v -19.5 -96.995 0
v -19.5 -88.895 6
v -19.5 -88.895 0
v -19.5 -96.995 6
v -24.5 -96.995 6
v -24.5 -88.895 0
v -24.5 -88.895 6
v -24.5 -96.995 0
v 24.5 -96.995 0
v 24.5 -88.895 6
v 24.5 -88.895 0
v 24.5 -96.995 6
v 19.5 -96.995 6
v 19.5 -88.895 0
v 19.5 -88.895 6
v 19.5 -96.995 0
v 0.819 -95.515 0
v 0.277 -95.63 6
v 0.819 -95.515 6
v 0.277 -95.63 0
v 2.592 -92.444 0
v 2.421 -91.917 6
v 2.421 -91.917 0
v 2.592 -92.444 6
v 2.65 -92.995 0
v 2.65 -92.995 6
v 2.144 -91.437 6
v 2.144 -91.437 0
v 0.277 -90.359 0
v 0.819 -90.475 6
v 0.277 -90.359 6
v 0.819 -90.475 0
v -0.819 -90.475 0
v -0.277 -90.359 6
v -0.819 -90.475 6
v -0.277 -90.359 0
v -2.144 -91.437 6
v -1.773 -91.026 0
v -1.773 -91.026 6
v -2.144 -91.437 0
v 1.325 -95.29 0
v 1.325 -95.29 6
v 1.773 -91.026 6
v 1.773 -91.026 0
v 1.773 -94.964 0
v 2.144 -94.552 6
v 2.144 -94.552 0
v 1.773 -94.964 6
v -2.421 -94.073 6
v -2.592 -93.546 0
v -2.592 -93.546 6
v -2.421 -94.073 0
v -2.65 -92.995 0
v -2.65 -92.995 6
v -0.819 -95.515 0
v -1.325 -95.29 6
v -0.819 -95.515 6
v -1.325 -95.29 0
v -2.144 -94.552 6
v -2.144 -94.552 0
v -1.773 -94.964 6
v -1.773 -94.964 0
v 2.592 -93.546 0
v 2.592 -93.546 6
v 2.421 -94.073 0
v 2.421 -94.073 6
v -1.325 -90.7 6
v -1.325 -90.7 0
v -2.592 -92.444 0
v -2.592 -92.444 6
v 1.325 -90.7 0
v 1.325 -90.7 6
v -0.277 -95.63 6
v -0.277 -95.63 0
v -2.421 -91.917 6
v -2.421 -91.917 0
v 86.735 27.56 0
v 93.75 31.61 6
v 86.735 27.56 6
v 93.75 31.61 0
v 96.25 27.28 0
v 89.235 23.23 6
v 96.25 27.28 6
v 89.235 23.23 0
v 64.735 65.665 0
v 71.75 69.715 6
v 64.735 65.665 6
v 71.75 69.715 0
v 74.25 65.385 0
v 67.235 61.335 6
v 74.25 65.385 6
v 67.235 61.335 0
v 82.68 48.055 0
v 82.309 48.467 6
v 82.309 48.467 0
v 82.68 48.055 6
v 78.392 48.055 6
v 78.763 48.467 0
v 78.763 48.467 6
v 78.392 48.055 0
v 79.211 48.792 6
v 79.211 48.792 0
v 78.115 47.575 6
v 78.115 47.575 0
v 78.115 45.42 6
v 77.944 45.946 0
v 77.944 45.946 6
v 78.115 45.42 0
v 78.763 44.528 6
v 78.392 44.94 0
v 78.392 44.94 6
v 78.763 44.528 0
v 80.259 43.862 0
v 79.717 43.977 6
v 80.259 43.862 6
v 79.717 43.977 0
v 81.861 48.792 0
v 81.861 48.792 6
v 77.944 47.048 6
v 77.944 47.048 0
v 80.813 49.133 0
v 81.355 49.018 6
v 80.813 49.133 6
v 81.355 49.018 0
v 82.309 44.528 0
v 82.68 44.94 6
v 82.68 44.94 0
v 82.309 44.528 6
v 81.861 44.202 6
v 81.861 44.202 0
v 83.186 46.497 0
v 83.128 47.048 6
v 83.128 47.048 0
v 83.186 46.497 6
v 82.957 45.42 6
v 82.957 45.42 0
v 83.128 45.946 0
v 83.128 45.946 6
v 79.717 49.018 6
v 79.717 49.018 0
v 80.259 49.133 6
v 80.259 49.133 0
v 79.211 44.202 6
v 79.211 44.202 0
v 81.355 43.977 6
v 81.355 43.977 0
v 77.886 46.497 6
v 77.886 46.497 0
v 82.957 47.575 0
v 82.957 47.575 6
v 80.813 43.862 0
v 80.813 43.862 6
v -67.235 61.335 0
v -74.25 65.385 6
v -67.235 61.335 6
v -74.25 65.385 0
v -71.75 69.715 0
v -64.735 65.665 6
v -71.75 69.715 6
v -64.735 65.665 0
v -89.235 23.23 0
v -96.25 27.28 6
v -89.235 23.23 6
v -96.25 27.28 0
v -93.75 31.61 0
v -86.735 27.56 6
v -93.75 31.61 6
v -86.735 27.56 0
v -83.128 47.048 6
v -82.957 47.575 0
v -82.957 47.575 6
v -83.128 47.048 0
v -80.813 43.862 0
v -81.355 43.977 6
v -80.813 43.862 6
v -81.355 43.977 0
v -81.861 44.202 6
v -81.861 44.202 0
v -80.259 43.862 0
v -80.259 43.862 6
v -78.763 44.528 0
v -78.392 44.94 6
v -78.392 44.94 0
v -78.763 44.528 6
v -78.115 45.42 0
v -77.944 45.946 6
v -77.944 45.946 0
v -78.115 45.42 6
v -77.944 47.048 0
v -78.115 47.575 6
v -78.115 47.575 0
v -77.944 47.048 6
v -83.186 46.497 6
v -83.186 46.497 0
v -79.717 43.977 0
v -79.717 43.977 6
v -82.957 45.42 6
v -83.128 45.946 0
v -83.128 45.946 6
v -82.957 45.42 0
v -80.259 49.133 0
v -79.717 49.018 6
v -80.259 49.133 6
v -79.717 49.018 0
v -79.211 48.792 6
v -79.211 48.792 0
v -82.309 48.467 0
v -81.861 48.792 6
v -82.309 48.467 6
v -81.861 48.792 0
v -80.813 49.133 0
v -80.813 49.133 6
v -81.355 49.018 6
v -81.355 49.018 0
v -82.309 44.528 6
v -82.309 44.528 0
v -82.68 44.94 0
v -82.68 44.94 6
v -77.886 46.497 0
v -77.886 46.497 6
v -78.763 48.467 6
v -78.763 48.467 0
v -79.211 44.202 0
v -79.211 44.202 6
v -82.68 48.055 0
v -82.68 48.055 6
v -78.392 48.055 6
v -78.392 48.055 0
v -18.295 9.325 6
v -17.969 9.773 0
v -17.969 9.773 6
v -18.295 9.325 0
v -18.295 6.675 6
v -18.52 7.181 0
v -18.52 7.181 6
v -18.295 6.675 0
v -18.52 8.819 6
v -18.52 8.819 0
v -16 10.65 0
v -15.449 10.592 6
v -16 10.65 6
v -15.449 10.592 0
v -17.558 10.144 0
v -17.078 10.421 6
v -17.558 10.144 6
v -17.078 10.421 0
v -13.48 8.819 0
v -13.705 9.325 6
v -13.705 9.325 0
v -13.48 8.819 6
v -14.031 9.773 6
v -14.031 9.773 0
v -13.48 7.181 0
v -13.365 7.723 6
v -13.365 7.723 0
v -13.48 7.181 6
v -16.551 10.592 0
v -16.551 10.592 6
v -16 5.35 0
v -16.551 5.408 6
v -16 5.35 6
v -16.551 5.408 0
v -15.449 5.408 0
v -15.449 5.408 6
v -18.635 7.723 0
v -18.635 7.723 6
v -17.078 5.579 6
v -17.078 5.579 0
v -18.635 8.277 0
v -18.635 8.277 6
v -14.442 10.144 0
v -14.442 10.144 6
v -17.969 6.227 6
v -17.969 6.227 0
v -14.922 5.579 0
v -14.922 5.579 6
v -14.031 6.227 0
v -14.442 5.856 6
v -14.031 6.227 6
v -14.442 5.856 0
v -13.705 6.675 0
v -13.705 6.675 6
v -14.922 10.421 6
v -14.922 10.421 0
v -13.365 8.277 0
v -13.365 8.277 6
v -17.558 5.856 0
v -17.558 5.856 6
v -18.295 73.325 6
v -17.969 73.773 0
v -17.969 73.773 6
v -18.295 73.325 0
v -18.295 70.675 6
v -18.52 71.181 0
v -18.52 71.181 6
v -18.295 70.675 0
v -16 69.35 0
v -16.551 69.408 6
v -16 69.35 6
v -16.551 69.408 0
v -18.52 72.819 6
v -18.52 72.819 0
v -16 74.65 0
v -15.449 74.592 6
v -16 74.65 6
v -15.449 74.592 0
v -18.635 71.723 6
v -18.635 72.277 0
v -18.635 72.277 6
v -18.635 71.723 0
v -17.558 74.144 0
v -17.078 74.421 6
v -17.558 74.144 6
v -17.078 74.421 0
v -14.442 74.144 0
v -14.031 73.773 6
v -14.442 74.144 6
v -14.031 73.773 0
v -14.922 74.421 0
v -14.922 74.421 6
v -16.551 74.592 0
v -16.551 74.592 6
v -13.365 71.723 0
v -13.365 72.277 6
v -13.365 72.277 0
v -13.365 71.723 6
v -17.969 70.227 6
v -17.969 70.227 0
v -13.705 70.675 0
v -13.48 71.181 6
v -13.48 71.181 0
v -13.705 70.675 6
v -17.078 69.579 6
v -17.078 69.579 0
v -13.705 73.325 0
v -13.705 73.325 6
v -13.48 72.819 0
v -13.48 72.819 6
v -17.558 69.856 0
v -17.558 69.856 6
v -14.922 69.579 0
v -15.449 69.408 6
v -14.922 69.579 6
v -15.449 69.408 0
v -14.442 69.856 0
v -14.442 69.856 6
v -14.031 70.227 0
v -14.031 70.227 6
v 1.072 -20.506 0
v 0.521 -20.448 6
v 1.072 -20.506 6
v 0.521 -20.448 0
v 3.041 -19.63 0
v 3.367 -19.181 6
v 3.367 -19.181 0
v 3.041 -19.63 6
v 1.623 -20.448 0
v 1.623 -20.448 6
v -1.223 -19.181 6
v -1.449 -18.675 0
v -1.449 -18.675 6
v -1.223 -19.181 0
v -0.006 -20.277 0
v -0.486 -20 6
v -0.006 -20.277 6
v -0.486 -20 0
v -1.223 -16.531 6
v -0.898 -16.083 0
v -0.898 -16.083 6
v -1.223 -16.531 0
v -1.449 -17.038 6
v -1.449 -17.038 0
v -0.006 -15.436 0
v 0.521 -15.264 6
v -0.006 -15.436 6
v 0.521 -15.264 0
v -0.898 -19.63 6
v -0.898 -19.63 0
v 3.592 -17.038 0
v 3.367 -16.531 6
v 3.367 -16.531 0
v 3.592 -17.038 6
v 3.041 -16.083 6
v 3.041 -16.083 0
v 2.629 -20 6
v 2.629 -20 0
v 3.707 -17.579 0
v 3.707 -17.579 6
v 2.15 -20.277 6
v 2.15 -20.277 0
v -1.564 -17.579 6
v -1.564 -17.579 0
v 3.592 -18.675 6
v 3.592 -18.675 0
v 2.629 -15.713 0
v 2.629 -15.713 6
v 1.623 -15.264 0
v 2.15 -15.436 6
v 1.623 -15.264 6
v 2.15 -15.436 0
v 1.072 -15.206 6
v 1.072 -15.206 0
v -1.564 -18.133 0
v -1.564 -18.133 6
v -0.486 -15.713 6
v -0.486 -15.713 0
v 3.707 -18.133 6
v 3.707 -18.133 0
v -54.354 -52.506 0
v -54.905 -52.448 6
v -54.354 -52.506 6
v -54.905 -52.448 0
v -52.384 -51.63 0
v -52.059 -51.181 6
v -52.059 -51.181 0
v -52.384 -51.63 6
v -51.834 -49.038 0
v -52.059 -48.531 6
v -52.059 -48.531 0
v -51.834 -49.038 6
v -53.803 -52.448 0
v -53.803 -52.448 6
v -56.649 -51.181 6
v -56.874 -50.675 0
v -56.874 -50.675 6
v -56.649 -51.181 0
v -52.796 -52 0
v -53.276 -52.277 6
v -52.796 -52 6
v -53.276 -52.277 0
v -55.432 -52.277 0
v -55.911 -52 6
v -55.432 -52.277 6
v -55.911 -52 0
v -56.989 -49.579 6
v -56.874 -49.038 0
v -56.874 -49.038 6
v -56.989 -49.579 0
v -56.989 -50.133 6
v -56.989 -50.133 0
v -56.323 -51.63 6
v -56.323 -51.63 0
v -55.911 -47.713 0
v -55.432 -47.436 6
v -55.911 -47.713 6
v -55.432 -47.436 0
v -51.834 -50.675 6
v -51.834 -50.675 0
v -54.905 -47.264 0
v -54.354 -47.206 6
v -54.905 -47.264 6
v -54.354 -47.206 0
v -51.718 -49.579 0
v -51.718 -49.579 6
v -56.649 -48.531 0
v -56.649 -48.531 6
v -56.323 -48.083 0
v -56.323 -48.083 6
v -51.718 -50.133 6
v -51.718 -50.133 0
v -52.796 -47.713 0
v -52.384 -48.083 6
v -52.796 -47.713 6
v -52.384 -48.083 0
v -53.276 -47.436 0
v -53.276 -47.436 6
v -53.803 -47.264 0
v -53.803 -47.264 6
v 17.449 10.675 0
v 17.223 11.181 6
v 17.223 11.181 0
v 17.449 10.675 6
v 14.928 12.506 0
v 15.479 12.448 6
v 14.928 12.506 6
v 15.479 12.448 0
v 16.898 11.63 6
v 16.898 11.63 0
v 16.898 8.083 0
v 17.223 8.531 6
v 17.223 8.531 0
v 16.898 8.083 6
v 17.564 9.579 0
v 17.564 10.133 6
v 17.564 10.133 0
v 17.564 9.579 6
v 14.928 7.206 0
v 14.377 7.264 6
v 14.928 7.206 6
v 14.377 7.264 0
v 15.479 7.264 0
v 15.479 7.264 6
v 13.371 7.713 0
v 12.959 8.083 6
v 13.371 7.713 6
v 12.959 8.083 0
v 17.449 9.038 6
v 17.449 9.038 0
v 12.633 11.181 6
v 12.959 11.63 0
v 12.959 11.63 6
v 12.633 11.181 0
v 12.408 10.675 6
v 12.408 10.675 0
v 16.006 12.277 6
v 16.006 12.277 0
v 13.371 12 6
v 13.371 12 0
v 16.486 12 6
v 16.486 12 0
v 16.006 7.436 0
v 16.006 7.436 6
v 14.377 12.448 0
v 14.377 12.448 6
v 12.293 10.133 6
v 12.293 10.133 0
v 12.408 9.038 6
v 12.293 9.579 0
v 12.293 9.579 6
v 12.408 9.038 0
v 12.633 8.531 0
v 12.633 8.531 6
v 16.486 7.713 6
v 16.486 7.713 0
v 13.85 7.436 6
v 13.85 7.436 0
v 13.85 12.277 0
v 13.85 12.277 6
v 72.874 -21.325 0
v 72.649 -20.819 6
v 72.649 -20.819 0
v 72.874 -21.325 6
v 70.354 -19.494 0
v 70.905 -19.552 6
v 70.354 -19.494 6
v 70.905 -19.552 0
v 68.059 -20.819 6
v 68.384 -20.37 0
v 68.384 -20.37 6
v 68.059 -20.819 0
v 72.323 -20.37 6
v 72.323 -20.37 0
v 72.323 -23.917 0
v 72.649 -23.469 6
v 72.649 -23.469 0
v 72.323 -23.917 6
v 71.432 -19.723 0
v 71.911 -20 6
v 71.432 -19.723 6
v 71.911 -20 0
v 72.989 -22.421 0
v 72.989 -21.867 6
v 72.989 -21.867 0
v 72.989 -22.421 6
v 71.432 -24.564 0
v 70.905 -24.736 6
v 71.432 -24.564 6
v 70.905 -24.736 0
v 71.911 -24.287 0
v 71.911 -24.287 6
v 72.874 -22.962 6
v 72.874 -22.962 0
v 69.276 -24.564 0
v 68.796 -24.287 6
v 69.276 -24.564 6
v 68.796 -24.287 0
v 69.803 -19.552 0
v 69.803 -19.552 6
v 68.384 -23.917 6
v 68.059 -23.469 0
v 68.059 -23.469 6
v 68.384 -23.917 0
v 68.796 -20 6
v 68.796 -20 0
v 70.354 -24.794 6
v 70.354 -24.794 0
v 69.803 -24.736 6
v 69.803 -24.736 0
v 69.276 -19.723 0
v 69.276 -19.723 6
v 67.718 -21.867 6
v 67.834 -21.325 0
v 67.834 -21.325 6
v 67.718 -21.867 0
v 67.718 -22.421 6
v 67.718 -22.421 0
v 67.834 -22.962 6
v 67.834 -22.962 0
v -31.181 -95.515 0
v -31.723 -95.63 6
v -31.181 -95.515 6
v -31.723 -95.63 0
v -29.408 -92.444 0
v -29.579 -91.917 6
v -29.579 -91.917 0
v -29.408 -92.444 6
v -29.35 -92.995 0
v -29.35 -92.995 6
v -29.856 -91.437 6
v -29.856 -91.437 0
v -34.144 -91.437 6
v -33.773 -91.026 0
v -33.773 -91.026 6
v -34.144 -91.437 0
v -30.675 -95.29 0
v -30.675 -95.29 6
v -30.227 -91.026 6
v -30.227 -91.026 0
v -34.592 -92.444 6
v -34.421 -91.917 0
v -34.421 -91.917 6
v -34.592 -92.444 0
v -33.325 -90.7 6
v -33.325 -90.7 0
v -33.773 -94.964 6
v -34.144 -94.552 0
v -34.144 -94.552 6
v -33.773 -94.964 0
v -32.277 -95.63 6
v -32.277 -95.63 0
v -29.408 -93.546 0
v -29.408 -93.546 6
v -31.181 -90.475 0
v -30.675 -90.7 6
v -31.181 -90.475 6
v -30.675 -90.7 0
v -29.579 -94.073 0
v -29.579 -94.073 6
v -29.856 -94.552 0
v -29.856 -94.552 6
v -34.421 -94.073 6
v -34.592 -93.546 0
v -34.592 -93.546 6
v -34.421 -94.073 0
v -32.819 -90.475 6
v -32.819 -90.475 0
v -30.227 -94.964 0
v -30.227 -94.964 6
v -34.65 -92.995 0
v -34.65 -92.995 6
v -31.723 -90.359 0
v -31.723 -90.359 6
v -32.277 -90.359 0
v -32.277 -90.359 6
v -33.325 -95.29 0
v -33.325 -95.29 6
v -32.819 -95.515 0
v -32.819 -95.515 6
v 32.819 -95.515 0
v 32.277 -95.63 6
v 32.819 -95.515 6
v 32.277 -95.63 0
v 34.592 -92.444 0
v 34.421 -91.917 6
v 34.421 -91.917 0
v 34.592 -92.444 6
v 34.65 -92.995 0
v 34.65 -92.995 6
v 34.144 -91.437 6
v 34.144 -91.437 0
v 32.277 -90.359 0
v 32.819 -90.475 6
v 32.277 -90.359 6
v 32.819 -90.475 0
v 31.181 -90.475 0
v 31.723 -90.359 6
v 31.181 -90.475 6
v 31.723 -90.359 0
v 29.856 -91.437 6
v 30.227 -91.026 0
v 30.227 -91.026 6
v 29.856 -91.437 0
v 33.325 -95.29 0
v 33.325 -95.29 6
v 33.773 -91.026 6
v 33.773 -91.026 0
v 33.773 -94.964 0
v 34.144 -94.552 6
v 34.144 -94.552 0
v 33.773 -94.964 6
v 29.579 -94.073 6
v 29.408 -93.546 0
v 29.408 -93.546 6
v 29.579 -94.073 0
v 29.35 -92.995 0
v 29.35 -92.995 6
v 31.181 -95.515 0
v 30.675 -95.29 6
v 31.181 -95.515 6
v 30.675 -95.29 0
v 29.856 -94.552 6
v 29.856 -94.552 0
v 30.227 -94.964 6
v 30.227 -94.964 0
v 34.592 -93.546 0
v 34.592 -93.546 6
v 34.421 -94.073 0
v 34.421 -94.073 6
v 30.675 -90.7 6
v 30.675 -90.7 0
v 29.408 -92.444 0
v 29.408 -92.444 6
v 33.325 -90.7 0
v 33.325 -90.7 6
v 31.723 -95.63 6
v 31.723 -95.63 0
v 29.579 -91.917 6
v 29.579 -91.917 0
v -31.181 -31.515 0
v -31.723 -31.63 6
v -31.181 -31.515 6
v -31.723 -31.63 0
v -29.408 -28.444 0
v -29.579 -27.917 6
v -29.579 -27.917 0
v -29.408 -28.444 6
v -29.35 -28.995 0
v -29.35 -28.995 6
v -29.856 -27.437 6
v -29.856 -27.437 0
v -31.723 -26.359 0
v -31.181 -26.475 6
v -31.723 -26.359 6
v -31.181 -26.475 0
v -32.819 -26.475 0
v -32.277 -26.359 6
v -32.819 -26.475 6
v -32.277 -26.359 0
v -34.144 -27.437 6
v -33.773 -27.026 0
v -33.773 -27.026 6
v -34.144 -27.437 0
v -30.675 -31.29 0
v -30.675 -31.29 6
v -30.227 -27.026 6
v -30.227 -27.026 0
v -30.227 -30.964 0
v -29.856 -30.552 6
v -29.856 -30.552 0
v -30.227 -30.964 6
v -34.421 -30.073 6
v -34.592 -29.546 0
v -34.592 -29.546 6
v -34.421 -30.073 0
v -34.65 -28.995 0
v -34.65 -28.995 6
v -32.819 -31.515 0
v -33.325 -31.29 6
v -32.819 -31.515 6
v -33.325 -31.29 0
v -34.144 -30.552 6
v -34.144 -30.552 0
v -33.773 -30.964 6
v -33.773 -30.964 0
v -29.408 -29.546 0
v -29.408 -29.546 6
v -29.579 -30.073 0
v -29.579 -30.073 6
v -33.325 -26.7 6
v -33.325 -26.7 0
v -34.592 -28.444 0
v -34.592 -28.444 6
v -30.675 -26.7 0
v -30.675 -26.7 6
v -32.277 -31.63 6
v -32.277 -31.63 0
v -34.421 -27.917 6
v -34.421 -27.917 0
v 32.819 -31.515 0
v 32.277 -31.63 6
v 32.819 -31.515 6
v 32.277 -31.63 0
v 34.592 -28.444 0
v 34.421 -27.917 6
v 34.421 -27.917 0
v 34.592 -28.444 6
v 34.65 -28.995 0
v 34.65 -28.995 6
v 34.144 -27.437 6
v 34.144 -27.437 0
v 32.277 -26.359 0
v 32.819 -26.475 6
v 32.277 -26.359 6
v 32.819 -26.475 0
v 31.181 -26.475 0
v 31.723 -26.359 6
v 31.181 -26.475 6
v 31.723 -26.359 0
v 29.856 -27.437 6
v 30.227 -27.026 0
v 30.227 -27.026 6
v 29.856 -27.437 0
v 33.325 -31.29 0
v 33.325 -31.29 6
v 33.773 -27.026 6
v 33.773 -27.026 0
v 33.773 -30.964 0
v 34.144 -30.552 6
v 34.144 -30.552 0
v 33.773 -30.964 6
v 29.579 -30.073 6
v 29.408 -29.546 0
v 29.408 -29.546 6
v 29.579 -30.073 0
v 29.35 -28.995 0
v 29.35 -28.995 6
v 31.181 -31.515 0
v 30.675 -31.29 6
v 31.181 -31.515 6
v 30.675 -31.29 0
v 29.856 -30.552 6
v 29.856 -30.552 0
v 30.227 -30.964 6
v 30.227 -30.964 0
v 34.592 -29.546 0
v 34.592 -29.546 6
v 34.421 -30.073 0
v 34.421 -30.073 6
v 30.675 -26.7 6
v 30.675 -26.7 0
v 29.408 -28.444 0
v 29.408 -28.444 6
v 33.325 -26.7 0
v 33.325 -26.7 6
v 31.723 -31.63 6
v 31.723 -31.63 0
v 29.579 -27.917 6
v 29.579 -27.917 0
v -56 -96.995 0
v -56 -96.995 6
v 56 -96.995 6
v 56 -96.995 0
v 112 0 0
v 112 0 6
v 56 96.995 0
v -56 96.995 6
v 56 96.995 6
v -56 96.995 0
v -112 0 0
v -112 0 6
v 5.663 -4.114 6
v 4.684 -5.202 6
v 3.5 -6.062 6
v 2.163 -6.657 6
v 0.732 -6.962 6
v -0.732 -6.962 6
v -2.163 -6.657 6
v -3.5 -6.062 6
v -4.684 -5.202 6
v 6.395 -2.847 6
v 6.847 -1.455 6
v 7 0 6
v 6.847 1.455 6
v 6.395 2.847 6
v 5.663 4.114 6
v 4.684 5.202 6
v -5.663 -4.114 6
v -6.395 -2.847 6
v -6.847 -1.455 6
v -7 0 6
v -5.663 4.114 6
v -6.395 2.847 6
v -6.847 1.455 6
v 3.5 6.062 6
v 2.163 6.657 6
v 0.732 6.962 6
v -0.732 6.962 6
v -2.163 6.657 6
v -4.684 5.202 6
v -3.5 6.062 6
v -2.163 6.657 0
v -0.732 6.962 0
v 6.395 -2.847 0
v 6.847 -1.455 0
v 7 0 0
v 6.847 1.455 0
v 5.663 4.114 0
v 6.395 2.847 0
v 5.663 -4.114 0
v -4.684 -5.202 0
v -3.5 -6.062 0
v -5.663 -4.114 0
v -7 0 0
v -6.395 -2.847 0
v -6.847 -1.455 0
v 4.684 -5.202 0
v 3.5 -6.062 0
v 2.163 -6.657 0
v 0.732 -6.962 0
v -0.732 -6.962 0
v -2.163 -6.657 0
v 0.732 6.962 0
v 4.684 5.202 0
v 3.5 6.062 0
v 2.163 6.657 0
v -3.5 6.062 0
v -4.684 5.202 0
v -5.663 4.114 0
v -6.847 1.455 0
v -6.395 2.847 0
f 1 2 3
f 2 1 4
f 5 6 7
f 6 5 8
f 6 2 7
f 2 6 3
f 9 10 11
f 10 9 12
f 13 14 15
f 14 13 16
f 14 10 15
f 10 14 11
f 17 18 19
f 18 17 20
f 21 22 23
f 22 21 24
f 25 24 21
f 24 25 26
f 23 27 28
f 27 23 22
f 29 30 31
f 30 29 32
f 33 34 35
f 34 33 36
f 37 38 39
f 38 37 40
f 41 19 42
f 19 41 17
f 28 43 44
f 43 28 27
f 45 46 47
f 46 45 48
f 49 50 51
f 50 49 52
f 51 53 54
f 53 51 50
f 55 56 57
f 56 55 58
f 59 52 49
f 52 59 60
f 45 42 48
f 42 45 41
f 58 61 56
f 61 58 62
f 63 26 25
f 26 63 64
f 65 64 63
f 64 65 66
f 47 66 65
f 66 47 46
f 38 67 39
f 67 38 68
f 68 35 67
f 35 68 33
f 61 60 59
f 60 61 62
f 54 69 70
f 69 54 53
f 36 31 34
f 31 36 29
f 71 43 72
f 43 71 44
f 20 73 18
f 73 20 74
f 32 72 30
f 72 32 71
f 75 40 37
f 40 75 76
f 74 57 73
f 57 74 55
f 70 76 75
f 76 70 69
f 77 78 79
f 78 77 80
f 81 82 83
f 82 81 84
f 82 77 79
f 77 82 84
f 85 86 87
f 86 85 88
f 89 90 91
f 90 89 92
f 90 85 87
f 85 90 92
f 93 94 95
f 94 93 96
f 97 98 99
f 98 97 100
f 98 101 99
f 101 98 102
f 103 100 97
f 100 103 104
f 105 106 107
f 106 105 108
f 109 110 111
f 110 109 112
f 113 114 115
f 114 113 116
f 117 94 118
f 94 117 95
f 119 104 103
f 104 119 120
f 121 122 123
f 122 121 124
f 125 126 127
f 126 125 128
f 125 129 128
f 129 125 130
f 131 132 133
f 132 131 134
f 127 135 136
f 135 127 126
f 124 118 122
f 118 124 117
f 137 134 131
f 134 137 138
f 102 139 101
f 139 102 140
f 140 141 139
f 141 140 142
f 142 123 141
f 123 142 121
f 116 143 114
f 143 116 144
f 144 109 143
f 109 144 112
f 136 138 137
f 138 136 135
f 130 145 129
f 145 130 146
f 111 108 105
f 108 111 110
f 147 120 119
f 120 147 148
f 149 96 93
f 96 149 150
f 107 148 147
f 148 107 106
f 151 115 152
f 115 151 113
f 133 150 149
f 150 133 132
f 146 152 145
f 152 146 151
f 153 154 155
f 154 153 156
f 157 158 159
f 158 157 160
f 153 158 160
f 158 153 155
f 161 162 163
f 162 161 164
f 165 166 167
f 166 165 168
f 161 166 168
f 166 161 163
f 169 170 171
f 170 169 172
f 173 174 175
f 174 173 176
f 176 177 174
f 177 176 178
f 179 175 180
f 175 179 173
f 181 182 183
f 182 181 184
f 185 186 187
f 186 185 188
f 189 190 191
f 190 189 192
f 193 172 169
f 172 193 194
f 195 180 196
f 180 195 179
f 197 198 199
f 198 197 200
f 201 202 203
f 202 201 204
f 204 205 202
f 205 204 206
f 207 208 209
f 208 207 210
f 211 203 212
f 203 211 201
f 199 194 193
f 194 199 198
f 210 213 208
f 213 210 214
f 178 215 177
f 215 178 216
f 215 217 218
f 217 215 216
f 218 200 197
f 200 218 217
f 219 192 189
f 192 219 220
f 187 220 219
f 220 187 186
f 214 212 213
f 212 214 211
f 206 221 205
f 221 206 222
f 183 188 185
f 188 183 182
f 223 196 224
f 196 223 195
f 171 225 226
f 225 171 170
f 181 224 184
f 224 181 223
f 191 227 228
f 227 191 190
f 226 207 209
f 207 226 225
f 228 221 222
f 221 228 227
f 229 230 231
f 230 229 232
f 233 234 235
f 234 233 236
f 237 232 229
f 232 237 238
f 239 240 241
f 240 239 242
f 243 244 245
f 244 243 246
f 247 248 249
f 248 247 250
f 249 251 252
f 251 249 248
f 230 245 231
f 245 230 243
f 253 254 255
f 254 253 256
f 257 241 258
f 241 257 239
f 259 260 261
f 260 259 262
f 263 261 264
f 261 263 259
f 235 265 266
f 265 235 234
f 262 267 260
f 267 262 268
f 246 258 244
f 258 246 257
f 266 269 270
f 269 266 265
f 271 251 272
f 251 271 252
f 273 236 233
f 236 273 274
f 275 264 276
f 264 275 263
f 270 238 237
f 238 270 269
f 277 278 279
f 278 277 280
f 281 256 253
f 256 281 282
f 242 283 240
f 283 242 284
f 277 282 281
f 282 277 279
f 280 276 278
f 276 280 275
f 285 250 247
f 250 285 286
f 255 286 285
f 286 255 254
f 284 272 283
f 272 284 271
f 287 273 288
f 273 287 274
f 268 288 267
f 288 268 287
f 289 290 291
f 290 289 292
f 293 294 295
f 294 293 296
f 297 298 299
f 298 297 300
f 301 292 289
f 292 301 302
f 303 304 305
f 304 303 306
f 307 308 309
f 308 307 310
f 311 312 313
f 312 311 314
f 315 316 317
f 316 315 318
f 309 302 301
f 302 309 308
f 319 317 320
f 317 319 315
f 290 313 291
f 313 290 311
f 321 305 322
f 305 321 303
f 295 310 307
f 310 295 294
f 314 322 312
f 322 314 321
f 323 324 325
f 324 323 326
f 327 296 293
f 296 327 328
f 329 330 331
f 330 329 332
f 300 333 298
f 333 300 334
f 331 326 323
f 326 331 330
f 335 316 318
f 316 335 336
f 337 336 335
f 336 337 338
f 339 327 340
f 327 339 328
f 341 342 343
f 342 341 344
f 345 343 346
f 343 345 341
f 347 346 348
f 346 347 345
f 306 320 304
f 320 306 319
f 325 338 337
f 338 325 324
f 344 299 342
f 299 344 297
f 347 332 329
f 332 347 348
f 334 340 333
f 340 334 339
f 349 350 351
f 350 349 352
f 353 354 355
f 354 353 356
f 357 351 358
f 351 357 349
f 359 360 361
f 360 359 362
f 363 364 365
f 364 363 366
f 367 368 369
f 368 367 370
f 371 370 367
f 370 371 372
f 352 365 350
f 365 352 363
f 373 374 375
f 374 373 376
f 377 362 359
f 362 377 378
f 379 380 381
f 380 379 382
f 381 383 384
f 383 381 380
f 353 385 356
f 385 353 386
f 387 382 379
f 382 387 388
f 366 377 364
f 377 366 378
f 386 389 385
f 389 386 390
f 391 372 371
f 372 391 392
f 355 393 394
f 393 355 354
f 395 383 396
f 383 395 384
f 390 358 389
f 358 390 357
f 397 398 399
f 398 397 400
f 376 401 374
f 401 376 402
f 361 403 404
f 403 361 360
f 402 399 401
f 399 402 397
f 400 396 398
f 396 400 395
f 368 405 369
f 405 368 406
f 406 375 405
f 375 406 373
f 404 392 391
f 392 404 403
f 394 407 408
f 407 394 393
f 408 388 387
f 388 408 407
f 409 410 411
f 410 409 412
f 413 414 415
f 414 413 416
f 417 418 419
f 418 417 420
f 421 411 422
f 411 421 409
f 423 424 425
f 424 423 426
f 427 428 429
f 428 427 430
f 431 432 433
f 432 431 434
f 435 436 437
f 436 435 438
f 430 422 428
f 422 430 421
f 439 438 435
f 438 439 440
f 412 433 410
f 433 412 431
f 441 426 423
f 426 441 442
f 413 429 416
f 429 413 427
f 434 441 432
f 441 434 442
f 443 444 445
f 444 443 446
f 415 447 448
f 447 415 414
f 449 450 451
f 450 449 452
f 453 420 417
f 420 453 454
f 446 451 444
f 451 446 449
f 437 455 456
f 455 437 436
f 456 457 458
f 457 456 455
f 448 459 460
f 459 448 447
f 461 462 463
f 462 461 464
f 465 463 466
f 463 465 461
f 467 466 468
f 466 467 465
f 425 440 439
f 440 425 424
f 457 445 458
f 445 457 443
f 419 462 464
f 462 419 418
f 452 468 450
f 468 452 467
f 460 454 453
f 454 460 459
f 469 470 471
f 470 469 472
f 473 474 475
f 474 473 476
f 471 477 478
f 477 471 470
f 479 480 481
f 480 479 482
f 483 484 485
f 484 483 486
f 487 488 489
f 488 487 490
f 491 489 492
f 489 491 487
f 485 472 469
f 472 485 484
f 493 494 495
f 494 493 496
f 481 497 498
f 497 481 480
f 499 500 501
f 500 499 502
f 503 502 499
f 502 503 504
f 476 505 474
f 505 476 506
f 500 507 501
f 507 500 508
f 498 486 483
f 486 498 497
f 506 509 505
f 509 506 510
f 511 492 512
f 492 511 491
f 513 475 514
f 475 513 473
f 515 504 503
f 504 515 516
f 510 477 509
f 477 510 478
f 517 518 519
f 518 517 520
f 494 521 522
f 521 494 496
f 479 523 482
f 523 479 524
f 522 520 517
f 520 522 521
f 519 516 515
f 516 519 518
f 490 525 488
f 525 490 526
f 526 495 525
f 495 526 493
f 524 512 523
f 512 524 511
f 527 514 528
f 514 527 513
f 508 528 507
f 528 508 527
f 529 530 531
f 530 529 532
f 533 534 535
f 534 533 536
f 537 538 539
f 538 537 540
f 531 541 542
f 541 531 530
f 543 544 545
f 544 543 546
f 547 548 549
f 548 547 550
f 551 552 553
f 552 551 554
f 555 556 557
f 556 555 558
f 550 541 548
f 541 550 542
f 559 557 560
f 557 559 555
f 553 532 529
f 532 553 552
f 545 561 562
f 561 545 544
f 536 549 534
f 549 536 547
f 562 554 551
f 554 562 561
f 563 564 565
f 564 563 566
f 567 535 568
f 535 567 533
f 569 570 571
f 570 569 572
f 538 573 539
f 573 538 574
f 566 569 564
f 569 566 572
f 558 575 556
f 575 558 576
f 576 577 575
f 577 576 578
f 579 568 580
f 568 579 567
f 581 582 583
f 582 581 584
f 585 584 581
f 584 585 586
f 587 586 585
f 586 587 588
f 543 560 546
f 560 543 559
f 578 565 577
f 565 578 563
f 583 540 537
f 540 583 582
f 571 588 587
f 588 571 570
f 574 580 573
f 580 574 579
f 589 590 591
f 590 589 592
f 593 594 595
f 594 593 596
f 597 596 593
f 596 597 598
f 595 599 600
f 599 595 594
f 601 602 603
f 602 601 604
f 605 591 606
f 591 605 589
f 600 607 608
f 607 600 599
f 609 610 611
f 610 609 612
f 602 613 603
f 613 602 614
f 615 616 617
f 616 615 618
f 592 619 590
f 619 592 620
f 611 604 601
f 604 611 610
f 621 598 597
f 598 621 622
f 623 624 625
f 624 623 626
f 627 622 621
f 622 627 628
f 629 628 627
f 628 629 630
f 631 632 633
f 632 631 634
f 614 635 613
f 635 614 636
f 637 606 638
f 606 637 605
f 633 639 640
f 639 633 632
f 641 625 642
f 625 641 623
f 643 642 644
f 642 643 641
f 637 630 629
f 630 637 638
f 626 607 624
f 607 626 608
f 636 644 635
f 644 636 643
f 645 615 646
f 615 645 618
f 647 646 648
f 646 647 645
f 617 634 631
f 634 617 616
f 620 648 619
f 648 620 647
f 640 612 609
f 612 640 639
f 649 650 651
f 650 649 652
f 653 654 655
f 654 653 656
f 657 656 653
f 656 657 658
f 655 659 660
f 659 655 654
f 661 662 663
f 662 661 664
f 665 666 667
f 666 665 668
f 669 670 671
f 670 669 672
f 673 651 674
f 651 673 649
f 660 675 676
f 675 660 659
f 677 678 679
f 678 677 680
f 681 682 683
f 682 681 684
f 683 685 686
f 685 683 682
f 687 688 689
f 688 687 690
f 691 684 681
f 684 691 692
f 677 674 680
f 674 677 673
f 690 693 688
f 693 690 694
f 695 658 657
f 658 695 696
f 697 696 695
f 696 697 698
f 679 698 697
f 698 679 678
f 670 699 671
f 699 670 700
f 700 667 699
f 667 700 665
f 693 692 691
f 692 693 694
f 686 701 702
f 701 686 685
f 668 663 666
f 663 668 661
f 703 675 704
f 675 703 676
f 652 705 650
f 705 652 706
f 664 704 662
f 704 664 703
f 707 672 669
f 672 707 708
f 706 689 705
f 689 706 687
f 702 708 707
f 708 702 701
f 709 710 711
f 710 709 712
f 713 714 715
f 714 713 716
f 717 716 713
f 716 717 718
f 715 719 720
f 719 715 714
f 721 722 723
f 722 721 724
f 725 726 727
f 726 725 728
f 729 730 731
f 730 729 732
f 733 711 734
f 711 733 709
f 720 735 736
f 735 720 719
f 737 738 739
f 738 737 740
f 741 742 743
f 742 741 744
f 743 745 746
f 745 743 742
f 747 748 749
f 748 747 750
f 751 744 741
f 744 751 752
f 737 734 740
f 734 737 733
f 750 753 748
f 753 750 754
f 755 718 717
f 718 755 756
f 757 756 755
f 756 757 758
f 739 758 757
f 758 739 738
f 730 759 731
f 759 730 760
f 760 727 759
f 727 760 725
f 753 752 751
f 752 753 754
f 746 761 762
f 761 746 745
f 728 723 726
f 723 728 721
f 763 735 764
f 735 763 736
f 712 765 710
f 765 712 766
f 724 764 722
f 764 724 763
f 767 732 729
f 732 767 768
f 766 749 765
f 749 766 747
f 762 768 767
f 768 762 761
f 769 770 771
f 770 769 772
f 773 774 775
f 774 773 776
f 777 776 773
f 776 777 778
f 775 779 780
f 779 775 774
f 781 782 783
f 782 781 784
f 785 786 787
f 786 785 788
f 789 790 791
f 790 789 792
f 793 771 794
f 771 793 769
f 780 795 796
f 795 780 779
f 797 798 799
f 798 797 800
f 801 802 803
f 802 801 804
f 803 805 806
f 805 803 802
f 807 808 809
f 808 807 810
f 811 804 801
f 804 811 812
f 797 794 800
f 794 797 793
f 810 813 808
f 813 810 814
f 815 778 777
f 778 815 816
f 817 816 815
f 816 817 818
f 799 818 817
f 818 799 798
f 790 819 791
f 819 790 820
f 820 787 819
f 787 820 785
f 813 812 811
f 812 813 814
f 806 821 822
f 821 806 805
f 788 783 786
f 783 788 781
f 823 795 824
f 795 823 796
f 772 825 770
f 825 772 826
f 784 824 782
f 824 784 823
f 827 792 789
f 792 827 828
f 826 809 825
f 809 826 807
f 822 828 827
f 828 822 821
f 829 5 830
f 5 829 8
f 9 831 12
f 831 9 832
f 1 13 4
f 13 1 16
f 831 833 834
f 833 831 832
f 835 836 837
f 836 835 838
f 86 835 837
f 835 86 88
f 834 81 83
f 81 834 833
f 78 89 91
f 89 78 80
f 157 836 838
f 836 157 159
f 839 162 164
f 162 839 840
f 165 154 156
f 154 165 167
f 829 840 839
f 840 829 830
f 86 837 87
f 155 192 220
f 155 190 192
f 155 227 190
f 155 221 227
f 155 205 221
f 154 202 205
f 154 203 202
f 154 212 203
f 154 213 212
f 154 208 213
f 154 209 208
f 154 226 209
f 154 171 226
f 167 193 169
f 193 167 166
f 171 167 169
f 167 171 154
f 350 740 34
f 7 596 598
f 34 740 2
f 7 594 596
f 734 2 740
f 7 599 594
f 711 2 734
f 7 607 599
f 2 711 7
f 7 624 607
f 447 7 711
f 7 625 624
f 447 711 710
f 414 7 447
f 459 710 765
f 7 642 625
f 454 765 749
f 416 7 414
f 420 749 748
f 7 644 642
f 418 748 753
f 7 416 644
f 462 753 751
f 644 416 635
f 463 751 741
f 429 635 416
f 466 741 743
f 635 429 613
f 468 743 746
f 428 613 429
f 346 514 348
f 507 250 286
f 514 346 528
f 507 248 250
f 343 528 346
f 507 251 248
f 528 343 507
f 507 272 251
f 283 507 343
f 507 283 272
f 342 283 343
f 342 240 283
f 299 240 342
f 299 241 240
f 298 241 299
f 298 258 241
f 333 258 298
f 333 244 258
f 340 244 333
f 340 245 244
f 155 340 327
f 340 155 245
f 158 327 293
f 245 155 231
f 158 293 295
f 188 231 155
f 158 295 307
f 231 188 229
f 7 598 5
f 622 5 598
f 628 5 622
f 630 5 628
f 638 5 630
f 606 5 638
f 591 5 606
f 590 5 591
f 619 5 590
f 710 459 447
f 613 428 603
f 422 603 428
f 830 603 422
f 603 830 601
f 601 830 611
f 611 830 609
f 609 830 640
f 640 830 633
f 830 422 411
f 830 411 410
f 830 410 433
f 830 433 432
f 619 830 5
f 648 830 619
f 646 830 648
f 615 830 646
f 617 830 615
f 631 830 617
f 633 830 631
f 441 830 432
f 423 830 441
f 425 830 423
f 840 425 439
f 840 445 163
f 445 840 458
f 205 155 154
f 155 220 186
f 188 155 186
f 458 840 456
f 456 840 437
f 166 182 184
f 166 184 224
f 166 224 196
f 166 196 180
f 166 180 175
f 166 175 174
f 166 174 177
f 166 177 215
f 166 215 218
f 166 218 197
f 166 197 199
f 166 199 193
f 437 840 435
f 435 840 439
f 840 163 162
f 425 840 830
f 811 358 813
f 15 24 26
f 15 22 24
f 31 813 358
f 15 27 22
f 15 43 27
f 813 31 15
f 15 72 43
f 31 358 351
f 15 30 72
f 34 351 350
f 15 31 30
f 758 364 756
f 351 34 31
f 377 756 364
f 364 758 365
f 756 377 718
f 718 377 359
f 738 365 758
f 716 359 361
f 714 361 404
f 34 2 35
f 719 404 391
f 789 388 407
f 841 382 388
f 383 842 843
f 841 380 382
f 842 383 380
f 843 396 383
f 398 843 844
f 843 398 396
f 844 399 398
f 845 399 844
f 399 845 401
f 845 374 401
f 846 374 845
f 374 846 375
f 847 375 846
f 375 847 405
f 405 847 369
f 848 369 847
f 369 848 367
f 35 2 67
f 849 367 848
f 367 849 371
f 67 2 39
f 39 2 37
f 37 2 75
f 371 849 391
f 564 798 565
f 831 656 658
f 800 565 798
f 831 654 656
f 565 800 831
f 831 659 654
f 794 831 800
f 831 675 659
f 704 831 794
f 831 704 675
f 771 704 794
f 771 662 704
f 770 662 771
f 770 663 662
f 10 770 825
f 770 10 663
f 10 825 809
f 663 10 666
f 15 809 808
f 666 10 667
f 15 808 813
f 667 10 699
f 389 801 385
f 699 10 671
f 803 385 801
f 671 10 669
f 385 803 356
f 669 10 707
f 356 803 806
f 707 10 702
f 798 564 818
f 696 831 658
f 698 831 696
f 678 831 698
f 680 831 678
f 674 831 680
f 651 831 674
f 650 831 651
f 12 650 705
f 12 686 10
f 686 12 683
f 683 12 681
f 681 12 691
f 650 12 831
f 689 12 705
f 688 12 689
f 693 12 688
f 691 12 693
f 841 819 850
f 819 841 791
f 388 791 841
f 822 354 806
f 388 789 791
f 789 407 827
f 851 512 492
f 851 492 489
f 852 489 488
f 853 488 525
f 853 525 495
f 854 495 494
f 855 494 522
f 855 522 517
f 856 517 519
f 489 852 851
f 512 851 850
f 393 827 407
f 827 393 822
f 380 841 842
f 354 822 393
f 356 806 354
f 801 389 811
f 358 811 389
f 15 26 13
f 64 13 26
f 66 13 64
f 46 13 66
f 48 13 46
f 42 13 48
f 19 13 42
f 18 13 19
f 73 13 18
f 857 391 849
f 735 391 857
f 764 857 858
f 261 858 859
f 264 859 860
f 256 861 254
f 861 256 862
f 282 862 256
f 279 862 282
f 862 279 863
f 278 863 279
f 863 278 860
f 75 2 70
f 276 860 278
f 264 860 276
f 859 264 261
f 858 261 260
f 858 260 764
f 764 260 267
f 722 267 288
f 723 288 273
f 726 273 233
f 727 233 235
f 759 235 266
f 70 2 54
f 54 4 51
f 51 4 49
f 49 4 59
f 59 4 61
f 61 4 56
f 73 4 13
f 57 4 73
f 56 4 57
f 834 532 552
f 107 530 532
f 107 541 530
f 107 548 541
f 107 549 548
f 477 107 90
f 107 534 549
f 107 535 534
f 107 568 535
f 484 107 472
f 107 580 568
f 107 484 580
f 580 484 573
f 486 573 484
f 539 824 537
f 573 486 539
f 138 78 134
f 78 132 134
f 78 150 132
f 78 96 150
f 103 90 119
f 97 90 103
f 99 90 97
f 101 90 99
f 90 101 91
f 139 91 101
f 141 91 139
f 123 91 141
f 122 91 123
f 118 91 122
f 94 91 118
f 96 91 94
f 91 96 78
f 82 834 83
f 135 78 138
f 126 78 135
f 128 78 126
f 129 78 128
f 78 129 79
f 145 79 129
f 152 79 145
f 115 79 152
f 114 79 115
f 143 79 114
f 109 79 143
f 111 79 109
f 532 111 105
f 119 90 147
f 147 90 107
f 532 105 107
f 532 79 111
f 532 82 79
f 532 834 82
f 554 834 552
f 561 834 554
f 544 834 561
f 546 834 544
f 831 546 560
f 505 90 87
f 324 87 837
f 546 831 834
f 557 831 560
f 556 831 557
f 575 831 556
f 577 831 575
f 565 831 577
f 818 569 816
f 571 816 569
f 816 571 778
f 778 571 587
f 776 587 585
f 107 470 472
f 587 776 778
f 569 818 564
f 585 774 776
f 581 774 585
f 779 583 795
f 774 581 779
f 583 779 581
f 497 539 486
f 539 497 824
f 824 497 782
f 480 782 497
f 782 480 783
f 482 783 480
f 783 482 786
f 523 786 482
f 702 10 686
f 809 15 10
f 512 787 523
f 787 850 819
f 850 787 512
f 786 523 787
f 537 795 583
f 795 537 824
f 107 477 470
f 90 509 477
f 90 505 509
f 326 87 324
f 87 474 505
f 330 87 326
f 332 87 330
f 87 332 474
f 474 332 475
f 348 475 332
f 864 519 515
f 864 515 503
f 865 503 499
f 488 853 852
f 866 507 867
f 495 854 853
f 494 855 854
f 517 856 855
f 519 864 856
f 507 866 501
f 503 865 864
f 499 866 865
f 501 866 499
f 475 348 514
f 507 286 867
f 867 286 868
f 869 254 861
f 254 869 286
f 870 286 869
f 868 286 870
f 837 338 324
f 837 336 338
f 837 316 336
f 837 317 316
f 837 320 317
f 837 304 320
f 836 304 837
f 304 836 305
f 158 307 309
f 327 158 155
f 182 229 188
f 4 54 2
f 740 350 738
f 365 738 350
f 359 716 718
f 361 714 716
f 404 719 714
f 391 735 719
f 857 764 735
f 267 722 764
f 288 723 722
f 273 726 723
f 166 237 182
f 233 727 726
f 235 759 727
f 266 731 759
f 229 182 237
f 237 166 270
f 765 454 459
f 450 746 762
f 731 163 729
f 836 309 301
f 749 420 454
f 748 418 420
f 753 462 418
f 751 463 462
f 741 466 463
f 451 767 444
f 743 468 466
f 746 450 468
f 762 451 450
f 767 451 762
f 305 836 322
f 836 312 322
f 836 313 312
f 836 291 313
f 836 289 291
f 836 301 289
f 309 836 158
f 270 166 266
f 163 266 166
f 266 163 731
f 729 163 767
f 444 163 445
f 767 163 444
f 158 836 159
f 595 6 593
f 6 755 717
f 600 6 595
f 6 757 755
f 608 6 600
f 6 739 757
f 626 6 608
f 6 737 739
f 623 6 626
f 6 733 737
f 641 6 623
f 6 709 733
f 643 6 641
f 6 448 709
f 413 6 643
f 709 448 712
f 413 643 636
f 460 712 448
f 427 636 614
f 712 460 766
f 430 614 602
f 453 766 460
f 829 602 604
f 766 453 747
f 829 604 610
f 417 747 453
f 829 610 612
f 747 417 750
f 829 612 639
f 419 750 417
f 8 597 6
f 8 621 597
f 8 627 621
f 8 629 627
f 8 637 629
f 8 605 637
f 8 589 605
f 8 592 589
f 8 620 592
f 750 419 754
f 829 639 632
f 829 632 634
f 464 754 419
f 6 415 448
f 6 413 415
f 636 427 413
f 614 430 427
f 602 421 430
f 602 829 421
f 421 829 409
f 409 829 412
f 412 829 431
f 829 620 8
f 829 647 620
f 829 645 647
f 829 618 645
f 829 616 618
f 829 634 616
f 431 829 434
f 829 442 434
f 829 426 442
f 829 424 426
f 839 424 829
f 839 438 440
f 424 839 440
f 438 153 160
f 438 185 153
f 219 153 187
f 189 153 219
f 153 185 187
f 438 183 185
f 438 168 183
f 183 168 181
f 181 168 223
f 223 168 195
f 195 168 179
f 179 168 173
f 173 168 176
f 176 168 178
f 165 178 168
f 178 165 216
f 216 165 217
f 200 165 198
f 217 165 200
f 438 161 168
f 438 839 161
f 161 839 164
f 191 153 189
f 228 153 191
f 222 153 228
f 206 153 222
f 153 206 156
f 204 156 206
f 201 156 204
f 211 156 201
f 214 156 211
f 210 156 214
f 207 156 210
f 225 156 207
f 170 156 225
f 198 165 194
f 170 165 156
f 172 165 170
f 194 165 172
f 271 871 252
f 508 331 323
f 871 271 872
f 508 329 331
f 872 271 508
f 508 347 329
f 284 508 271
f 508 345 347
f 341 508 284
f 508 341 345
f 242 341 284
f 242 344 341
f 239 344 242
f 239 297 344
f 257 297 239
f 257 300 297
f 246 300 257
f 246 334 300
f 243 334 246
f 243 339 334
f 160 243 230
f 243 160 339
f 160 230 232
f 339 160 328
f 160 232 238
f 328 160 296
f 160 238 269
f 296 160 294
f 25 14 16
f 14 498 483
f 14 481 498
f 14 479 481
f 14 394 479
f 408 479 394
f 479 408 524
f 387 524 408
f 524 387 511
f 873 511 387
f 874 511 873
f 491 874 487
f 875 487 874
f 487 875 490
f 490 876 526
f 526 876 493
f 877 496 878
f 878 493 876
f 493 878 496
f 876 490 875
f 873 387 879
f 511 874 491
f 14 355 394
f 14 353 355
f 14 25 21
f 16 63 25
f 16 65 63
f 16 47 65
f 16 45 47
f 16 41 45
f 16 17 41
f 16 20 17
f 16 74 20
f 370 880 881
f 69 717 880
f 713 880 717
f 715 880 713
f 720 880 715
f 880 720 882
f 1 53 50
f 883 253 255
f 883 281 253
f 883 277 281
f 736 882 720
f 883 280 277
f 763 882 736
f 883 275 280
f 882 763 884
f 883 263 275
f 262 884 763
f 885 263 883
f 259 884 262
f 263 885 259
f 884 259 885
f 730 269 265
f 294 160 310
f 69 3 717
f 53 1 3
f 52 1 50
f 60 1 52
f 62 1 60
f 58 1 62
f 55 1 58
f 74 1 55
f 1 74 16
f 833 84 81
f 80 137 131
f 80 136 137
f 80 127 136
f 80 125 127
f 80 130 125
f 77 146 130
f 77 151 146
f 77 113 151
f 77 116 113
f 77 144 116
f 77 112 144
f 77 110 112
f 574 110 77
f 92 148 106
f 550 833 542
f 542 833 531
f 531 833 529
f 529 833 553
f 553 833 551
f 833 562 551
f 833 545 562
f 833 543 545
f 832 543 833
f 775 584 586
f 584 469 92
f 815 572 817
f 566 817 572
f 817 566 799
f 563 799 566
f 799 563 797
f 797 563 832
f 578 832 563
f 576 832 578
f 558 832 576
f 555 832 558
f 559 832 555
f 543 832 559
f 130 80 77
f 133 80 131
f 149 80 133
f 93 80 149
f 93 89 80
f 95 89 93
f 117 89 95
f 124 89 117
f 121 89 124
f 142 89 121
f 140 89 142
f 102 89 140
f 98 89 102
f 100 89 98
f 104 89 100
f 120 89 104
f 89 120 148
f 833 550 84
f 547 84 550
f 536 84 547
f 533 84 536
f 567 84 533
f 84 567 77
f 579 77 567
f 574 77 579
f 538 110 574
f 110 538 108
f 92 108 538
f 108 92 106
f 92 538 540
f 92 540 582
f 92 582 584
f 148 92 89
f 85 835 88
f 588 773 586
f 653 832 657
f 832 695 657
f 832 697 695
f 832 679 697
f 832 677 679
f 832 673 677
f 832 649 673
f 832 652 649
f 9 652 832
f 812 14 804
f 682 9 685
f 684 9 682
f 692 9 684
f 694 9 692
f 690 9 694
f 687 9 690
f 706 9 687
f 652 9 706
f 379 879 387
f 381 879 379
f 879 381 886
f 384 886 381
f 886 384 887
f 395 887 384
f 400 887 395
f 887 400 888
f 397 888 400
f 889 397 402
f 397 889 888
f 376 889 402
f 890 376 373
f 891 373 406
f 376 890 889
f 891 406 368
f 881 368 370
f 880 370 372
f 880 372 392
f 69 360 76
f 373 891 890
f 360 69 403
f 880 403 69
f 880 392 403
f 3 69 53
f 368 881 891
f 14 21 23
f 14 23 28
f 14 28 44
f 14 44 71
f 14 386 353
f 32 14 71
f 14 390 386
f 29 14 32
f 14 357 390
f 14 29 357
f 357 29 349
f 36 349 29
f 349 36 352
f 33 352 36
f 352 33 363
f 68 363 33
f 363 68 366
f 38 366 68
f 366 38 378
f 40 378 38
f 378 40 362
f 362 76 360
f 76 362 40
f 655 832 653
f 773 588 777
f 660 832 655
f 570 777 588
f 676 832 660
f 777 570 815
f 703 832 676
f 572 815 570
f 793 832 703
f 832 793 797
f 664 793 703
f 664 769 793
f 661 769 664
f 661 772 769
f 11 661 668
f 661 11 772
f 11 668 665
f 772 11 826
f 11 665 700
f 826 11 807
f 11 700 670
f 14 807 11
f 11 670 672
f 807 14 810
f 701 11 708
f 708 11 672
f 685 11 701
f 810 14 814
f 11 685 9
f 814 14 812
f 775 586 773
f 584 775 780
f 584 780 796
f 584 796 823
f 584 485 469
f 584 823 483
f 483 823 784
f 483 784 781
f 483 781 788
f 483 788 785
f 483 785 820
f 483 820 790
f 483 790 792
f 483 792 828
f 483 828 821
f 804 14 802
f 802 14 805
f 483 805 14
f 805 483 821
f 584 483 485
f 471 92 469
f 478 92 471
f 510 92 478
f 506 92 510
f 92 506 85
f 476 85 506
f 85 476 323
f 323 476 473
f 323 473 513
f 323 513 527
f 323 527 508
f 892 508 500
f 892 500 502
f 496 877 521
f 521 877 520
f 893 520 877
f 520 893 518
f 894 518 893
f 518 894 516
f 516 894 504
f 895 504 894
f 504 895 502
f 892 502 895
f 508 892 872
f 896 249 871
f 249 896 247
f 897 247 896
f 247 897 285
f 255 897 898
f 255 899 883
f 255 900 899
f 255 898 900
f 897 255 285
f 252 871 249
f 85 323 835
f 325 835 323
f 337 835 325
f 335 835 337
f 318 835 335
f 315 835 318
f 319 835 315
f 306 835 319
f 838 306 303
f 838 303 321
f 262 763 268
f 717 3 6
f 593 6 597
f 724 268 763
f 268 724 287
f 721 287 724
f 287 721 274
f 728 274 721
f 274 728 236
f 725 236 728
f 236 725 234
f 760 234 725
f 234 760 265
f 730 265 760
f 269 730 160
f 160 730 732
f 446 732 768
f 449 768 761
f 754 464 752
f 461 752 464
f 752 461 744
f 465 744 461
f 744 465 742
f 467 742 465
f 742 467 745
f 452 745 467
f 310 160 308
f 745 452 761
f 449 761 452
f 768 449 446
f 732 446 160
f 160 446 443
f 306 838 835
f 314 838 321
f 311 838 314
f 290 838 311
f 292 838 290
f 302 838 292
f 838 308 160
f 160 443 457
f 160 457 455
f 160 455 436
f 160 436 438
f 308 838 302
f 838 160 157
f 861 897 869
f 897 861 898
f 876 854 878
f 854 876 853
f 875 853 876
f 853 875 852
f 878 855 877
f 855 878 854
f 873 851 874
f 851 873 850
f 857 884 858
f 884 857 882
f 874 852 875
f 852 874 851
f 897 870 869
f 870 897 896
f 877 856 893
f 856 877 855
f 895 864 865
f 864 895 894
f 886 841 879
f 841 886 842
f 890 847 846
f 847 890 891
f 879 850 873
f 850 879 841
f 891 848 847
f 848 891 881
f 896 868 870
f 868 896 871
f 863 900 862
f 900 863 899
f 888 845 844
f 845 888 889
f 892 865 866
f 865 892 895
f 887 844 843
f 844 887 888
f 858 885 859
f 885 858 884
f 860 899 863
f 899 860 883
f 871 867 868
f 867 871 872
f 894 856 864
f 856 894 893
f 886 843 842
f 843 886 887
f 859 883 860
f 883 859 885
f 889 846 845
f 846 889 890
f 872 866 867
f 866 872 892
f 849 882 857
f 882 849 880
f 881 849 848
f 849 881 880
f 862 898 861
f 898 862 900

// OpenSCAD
// Description: Top plate for Tapster 2 Plus
// Project home: http://tapsterbot.com

// Slicer settings
// Infill density: 0.5
// Fill pattern: line
// Top/bottom fill pattern: rectilinear

beam_width    = 8;
hole_diameter = 5.3;
hole_radius   = hole_diameter / 2;

plate_radius = beam_width * 14;
distance_of_edge_from_center = sqrt(pow(plate_radius,2)-pow(plate_radius/2,2));
joint_hole_center = distance_of_edge_from_center-4;

module beam(number_of_holes, step=8) {
    beam_length = number_of_holes * 8;
    for (x=[beam_width/2 : step : beam_length]) {
        translate([x-4,beam_width/2-4,-4])
        cylinder(r=hole_radius, h=16, $fn=30);
    }
}


module joint(){
    translate([-20.5-4,-distance_of_edge_from_center-1,-4])
    cube([5,beam_width+1.1,14]);

    translate([15.5+4,-distance_of_edge_from_center-1,-4])
    cube([5,beam_width+1.1,14]);

    translate([0,-joint_hole_center,-10])
    cylinder(r=hole_radius, h=25, $fn=30);
}

module side_connectors() {
    joint();

    rotate(120)
    joint();

    rotate(240)
    joint();
}


// Uncomment 'projection' to create 2D (DXF-able) version
//projection(cut=true) {
union(){
    difference(){
        // Base plate
        cylinder(r=plate_radius, h=6, $fn=6);

        // Center hole
        translate([0,0,-2])
        cylinder(r=7, h=12, $fn=30);

        // Delta-bot leg mounting holes
        side_connectors();

        rotate(90)
        center_connectors();

        rotate(0)
        box();
    }

    rotate([0,0,180])
    translate([0,-50,4])
    linear_extrude(center=true, height=8) import("tapster.dxf");
}
//}


module box() {
        // Bottom row
        for (x=[8 :  beam_width * 8 : beam_width * 9]) {
            translate([x-8*5, -joint_hole_center, -10])
            cylinder(r=hole_radius, h=20, $fn=30);
        }

        // Top row
        for (x=[8 : beam_width * 8 : beam_width * 9]) {
            translate([x-8*5, -joint_hole_center+8*8, -10])
            cylinder(r=hole_radius, h=20, $fn=30);
       }
}

module center_connectors() {
    translate([8,16,0])
    rotate(a=0)
    beam(10,step=8*8);

    rotate(a=120)
    translate([8,16,0])
    beam(10,step=8*8);

    rotate(a=240)
    translate([8,16,0])
    beam(10,step=8*8);
}
